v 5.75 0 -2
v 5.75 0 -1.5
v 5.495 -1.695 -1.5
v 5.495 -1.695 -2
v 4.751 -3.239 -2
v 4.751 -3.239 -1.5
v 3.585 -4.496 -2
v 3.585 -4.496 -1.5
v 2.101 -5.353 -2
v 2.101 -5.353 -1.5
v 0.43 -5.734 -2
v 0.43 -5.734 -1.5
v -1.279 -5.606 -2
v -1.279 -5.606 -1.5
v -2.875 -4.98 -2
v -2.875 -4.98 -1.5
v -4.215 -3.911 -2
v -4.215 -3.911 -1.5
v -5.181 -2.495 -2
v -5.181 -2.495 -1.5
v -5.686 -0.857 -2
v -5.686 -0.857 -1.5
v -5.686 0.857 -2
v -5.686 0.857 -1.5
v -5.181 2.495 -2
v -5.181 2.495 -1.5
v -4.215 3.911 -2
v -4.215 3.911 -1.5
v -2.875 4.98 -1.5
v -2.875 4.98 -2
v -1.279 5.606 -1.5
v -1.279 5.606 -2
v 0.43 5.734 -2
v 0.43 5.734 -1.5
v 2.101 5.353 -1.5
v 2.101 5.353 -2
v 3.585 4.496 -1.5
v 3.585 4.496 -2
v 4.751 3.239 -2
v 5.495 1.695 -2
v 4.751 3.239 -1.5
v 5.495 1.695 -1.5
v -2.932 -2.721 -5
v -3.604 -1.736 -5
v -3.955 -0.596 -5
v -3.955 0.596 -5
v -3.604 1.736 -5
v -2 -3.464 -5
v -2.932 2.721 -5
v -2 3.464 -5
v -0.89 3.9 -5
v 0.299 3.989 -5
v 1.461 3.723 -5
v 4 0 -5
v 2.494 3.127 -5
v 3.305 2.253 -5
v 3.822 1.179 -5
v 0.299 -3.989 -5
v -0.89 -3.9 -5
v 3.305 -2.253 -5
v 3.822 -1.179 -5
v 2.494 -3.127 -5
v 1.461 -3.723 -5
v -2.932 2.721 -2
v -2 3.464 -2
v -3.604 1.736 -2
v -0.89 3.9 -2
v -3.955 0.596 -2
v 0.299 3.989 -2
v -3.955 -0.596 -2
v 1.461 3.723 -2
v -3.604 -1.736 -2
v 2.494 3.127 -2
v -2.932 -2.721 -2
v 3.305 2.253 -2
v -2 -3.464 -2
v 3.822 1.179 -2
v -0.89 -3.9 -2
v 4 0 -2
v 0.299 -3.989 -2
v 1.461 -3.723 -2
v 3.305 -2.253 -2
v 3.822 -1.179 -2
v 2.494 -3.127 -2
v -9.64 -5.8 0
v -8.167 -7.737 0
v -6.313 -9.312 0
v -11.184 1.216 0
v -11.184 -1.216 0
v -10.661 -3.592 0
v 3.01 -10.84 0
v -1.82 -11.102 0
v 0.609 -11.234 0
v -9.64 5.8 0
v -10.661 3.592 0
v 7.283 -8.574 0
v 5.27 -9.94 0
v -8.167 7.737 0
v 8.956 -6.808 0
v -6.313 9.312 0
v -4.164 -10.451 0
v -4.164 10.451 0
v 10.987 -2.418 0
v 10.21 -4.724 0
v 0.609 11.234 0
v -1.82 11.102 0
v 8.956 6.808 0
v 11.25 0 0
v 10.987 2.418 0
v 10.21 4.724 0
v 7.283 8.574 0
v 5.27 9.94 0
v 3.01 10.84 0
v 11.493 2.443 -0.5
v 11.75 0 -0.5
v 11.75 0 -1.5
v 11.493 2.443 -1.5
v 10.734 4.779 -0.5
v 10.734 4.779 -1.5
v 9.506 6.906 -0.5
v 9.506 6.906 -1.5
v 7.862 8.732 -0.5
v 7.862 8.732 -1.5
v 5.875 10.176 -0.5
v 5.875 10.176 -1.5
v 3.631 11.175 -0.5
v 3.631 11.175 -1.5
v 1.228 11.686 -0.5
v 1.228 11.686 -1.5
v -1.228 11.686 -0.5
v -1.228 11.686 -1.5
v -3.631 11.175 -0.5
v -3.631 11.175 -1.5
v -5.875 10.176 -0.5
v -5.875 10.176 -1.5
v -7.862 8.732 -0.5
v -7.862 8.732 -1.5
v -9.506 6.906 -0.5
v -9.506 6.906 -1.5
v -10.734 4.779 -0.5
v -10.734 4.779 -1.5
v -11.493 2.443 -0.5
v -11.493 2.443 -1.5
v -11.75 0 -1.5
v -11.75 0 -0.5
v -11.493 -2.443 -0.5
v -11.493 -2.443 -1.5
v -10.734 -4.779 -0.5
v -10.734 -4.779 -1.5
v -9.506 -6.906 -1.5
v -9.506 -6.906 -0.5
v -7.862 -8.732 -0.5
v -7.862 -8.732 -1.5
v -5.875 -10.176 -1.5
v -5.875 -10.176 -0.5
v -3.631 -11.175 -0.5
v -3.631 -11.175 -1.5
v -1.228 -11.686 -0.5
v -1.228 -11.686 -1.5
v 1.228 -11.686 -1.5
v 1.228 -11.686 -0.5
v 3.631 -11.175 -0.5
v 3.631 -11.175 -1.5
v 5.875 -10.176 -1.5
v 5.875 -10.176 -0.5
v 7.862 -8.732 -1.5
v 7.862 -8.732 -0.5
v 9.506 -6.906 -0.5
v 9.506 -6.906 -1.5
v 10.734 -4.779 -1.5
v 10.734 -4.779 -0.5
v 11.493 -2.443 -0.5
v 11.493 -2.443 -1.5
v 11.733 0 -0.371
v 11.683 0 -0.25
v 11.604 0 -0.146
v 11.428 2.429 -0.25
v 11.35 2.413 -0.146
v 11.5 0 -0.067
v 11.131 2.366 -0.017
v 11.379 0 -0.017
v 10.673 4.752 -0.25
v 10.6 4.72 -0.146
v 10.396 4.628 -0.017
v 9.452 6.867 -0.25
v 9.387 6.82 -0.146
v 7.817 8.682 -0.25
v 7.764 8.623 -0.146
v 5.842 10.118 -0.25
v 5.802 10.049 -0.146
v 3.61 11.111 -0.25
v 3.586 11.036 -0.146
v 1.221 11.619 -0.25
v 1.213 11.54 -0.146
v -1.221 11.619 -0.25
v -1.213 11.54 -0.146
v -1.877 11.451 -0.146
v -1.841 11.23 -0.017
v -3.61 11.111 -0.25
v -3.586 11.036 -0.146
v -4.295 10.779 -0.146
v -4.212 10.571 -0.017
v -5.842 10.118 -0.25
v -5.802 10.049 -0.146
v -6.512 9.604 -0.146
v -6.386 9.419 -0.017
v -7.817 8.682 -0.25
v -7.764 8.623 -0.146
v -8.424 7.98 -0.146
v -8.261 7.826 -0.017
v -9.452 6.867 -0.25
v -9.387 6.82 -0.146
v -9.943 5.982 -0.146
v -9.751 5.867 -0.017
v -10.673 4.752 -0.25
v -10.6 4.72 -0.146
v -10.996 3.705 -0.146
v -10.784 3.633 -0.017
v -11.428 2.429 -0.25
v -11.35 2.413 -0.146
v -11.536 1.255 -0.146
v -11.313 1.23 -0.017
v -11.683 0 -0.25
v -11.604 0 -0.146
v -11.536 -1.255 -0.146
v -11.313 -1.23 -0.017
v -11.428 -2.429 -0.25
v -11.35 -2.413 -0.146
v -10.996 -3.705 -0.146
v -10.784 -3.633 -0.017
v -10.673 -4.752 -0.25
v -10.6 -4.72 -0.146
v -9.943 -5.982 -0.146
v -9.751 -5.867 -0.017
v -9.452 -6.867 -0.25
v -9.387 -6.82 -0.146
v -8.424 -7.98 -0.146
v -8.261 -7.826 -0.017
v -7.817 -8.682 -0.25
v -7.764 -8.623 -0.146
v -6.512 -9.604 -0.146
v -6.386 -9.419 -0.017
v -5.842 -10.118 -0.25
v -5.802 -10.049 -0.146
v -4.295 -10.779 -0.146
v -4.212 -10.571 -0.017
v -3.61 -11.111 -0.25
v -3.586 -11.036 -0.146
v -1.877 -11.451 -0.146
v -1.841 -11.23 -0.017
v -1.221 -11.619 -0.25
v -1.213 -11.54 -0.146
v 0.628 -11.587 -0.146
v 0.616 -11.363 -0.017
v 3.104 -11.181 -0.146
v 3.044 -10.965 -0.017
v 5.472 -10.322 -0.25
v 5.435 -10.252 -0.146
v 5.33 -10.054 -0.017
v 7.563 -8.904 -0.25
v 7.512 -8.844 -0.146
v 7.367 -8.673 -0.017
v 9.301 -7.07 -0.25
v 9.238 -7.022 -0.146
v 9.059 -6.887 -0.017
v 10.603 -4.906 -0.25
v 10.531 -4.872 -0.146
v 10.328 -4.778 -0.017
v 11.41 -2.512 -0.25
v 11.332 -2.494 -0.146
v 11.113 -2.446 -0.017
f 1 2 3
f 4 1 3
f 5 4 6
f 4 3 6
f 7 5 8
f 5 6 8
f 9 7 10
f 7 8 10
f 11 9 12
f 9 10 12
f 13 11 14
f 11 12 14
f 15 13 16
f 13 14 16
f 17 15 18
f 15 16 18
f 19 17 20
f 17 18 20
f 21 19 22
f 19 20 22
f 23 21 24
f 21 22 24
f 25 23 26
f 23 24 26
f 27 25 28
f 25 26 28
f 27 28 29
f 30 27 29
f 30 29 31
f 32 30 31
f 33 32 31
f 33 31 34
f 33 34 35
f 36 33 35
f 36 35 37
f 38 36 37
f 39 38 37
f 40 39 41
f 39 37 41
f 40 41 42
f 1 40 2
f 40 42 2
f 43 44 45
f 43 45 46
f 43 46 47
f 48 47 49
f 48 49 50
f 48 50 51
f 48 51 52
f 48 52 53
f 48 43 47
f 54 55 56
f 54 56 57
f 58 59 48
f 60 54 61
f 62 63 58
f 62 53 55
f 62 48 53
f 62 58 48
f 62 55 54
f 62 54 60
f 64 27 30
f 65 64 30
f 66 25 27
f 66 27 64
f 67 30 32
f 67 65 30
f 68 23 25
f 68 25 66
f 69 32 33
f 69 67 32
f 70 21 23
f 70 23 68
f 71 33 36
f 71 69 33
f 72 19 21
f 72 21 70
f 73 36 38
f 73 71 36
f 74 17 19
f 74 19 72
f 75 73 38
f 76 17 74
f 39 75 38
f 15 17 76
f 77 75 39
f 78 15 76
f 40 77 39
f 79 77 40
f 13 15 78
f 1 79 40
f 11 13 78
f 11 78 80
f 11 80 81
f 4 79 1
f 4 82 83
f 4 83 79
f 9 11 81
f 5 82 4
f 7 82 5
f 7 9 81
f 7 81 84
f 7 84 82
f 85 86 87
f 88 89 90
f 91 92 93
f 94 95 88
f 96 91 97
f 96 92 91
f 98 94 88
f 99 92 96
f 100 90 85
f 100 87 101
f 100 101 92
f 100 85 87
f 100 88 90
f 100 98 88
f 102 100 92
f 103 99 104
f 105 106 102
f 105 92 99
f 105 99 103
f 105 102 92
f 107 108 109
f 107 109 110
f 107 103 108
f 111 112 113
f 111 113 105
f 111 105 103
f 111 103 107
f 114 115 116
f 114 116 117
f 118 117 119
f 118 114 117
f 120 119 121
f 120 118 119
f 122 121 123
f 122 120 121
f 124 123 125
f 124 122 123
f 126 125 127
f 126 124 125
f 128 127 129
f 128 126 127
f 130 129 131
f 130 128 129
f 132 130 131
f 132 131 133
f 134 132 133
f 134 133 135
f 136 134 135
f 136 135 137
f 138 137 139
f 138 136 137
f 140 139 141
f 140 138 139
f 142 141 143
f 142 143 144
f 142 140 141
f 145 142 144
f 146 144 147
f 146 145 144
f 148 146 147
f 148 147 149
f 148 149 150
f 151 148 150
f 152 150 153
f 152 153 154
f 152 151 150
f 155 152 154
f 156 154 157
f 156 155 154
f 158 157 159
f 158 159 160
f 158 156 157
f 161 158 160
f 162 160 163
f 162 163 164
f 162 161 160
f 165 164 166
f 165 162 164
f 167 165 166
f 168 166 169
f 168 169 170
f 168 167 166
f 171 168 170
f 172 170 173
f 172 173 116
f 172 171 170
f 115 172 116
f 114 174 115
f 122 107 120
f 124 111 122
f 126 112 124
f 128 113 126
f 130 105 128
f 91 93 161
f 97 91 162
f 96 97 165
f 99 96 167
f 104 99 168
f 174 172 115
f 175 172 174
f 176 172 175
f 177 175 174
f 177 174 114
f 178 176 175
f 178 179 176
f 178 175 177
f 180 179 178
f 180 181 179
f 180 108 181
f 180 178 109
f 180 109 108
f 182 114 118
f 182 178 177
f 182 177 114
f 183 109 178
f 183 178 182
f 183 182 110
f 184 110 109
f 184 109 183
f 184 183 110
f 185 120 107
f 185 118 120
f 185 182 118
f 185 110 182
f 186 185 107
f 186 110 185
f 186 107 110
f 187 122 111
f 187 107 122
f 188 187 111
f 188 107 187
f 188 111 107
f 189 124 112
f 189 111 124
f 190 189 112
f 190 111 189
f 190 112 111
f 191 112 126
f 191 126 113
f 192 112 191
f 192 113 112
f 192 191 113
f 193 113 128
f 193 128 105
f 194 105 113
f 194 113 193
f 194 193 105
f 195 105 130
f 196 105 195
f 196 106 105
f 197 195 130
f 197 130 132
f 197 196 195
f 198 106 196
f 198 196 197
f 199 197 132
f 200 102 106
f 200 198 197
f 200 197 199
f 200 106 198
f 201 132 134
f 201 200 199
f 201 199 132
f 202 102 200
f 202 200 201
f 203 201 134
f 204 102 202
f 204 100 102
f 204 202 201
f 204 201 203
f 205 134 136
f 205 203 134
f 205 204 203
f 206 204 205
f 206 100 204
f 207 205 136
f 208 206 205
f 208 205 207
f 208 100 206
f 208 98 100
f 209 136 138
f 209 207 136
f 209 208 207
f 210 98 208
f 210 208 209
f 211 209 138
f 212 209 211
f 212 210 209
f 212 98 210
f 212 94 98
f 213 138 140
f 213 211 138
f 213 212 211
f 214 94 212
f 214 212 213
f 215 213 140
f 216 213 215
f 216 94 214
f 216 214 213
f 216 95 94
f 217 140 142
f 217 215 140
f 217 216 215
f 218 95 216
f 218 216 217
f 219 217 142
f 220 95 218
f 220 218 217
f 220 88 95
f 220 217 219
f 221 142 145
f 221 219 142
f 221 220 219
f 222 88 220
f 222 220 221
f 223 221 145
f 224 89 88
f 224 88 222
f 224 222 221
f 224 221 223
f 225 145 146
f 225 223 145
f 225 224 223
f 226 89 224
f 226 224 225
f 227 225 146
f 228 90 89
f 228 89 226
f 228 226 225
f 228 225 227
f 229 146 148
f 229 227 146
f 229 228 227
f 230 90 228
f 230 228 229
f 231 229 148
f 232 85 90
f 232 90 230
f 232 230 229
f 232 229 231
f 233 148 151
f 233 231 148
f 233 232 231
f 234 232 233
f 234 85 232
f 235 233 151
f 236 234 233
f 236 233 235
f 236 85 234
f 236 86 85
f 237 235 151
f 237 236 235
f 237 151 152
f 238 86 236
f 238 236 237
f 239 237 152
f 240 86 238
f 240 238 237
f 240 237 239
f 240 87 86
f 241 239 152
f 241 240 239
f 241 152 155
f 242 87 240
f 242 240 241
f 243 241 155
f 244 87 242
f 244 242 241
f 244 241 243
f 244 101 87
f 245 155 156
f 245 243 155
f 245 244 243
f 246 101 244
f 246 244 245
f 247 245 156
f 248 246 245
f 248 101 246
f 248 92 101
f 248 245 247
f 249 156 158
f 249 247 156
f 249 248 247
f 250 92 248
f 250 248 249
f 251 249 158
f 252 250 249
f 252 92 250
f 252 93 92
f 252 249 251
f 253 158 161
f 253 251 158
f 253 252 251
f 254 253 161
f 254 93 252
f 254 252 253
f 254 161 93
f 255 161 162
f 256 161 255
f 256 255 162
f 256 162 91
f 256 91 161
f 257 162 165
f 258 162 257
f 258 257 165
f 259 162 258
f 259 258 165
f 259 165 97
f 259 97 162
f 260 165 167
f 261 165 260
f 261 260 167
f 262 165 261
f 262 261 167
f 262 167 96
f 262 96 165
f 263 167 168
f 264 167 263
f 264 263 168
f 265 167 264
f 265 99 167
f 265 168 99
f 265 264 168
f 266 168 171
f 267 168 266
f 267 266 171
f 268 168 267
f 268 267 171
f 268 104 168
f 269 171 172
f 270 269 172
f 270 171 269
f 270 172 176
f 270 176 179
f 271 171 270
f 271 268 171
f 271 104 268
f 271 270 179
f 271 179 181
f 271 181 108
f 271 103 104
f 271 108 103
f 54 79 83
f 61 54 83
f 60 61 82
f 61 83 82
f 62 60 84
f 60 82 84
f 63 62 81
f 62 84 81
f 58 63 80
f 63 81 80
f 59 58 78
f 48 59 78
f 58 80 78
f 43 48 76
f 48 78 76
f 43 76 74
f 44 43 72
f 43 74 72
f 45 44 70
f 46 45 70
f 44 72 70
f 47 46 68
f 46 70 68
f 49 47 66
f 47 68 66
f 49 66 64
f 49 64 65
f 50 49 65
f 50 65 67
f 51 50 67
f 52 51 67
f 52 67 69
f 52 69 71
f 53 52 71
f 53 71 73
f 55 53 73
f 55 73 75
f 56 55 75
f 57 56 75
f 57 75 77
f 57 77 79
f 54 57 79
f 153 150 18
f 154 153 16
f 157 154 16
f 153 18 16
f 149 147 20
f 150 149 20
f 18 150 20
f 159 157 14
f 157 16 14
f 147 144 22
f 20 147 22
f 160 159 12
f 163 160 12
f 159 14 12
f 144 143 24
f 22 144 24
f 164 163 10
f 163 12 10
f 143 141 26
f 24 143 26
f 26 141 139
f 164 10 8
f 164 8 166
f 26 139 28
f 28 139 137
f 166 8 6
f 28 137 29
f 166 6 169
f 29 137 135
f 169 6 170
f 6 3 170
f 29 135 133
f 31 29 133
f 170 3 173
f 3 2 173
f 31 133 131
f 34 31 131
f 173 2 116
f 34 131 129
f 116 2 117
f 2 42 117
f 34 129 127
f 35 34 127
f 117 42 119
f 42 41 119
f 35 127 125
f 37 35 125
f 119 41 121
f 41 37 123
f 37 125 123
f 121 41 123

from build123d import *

# Parameters (mm, degrees)
F0_R     = 11.75
F1_DEPTH = 1.5
F2_R     = 0.5
F3_R     = 4
F4_DEPTH = 3.5
F5_R     = 5.75
F6_DEPTH = 0.5


with BuildPart() as f1:
    # F0 (on Top) → F1 (new body)
    with BuildSketch(Plane.XY):
        Circle(F0_R)
    extrude(amount=-F1_DEPTH)

    # F2
    f2_edges = [f1.edges().sort_by_distance(p)[0] for p in [
        (-11.75, 0, 0),
    ]]
    fillet(f2_edges, radius=F2_R)

    # F3 (on face) → F4 (join)
    with BuildSketch(Plane(origin=(0, 0, -1.5), x_dir=(1, 0, 0), z_dir=(0, 0, -1))):
        Circle(F3_R)
    extrude(amount=F4_DEPTH)

    # F5 (on face) → F6 (join)
    with BuildSketch(Plane(origin=(0, 0, -1.5), x_dir=(1, 0, 0), z_dir=(0, 0, -1))):
        Circle(F5_R)
    extrude(amount=F6_DEPTH)


solid = f1.part
